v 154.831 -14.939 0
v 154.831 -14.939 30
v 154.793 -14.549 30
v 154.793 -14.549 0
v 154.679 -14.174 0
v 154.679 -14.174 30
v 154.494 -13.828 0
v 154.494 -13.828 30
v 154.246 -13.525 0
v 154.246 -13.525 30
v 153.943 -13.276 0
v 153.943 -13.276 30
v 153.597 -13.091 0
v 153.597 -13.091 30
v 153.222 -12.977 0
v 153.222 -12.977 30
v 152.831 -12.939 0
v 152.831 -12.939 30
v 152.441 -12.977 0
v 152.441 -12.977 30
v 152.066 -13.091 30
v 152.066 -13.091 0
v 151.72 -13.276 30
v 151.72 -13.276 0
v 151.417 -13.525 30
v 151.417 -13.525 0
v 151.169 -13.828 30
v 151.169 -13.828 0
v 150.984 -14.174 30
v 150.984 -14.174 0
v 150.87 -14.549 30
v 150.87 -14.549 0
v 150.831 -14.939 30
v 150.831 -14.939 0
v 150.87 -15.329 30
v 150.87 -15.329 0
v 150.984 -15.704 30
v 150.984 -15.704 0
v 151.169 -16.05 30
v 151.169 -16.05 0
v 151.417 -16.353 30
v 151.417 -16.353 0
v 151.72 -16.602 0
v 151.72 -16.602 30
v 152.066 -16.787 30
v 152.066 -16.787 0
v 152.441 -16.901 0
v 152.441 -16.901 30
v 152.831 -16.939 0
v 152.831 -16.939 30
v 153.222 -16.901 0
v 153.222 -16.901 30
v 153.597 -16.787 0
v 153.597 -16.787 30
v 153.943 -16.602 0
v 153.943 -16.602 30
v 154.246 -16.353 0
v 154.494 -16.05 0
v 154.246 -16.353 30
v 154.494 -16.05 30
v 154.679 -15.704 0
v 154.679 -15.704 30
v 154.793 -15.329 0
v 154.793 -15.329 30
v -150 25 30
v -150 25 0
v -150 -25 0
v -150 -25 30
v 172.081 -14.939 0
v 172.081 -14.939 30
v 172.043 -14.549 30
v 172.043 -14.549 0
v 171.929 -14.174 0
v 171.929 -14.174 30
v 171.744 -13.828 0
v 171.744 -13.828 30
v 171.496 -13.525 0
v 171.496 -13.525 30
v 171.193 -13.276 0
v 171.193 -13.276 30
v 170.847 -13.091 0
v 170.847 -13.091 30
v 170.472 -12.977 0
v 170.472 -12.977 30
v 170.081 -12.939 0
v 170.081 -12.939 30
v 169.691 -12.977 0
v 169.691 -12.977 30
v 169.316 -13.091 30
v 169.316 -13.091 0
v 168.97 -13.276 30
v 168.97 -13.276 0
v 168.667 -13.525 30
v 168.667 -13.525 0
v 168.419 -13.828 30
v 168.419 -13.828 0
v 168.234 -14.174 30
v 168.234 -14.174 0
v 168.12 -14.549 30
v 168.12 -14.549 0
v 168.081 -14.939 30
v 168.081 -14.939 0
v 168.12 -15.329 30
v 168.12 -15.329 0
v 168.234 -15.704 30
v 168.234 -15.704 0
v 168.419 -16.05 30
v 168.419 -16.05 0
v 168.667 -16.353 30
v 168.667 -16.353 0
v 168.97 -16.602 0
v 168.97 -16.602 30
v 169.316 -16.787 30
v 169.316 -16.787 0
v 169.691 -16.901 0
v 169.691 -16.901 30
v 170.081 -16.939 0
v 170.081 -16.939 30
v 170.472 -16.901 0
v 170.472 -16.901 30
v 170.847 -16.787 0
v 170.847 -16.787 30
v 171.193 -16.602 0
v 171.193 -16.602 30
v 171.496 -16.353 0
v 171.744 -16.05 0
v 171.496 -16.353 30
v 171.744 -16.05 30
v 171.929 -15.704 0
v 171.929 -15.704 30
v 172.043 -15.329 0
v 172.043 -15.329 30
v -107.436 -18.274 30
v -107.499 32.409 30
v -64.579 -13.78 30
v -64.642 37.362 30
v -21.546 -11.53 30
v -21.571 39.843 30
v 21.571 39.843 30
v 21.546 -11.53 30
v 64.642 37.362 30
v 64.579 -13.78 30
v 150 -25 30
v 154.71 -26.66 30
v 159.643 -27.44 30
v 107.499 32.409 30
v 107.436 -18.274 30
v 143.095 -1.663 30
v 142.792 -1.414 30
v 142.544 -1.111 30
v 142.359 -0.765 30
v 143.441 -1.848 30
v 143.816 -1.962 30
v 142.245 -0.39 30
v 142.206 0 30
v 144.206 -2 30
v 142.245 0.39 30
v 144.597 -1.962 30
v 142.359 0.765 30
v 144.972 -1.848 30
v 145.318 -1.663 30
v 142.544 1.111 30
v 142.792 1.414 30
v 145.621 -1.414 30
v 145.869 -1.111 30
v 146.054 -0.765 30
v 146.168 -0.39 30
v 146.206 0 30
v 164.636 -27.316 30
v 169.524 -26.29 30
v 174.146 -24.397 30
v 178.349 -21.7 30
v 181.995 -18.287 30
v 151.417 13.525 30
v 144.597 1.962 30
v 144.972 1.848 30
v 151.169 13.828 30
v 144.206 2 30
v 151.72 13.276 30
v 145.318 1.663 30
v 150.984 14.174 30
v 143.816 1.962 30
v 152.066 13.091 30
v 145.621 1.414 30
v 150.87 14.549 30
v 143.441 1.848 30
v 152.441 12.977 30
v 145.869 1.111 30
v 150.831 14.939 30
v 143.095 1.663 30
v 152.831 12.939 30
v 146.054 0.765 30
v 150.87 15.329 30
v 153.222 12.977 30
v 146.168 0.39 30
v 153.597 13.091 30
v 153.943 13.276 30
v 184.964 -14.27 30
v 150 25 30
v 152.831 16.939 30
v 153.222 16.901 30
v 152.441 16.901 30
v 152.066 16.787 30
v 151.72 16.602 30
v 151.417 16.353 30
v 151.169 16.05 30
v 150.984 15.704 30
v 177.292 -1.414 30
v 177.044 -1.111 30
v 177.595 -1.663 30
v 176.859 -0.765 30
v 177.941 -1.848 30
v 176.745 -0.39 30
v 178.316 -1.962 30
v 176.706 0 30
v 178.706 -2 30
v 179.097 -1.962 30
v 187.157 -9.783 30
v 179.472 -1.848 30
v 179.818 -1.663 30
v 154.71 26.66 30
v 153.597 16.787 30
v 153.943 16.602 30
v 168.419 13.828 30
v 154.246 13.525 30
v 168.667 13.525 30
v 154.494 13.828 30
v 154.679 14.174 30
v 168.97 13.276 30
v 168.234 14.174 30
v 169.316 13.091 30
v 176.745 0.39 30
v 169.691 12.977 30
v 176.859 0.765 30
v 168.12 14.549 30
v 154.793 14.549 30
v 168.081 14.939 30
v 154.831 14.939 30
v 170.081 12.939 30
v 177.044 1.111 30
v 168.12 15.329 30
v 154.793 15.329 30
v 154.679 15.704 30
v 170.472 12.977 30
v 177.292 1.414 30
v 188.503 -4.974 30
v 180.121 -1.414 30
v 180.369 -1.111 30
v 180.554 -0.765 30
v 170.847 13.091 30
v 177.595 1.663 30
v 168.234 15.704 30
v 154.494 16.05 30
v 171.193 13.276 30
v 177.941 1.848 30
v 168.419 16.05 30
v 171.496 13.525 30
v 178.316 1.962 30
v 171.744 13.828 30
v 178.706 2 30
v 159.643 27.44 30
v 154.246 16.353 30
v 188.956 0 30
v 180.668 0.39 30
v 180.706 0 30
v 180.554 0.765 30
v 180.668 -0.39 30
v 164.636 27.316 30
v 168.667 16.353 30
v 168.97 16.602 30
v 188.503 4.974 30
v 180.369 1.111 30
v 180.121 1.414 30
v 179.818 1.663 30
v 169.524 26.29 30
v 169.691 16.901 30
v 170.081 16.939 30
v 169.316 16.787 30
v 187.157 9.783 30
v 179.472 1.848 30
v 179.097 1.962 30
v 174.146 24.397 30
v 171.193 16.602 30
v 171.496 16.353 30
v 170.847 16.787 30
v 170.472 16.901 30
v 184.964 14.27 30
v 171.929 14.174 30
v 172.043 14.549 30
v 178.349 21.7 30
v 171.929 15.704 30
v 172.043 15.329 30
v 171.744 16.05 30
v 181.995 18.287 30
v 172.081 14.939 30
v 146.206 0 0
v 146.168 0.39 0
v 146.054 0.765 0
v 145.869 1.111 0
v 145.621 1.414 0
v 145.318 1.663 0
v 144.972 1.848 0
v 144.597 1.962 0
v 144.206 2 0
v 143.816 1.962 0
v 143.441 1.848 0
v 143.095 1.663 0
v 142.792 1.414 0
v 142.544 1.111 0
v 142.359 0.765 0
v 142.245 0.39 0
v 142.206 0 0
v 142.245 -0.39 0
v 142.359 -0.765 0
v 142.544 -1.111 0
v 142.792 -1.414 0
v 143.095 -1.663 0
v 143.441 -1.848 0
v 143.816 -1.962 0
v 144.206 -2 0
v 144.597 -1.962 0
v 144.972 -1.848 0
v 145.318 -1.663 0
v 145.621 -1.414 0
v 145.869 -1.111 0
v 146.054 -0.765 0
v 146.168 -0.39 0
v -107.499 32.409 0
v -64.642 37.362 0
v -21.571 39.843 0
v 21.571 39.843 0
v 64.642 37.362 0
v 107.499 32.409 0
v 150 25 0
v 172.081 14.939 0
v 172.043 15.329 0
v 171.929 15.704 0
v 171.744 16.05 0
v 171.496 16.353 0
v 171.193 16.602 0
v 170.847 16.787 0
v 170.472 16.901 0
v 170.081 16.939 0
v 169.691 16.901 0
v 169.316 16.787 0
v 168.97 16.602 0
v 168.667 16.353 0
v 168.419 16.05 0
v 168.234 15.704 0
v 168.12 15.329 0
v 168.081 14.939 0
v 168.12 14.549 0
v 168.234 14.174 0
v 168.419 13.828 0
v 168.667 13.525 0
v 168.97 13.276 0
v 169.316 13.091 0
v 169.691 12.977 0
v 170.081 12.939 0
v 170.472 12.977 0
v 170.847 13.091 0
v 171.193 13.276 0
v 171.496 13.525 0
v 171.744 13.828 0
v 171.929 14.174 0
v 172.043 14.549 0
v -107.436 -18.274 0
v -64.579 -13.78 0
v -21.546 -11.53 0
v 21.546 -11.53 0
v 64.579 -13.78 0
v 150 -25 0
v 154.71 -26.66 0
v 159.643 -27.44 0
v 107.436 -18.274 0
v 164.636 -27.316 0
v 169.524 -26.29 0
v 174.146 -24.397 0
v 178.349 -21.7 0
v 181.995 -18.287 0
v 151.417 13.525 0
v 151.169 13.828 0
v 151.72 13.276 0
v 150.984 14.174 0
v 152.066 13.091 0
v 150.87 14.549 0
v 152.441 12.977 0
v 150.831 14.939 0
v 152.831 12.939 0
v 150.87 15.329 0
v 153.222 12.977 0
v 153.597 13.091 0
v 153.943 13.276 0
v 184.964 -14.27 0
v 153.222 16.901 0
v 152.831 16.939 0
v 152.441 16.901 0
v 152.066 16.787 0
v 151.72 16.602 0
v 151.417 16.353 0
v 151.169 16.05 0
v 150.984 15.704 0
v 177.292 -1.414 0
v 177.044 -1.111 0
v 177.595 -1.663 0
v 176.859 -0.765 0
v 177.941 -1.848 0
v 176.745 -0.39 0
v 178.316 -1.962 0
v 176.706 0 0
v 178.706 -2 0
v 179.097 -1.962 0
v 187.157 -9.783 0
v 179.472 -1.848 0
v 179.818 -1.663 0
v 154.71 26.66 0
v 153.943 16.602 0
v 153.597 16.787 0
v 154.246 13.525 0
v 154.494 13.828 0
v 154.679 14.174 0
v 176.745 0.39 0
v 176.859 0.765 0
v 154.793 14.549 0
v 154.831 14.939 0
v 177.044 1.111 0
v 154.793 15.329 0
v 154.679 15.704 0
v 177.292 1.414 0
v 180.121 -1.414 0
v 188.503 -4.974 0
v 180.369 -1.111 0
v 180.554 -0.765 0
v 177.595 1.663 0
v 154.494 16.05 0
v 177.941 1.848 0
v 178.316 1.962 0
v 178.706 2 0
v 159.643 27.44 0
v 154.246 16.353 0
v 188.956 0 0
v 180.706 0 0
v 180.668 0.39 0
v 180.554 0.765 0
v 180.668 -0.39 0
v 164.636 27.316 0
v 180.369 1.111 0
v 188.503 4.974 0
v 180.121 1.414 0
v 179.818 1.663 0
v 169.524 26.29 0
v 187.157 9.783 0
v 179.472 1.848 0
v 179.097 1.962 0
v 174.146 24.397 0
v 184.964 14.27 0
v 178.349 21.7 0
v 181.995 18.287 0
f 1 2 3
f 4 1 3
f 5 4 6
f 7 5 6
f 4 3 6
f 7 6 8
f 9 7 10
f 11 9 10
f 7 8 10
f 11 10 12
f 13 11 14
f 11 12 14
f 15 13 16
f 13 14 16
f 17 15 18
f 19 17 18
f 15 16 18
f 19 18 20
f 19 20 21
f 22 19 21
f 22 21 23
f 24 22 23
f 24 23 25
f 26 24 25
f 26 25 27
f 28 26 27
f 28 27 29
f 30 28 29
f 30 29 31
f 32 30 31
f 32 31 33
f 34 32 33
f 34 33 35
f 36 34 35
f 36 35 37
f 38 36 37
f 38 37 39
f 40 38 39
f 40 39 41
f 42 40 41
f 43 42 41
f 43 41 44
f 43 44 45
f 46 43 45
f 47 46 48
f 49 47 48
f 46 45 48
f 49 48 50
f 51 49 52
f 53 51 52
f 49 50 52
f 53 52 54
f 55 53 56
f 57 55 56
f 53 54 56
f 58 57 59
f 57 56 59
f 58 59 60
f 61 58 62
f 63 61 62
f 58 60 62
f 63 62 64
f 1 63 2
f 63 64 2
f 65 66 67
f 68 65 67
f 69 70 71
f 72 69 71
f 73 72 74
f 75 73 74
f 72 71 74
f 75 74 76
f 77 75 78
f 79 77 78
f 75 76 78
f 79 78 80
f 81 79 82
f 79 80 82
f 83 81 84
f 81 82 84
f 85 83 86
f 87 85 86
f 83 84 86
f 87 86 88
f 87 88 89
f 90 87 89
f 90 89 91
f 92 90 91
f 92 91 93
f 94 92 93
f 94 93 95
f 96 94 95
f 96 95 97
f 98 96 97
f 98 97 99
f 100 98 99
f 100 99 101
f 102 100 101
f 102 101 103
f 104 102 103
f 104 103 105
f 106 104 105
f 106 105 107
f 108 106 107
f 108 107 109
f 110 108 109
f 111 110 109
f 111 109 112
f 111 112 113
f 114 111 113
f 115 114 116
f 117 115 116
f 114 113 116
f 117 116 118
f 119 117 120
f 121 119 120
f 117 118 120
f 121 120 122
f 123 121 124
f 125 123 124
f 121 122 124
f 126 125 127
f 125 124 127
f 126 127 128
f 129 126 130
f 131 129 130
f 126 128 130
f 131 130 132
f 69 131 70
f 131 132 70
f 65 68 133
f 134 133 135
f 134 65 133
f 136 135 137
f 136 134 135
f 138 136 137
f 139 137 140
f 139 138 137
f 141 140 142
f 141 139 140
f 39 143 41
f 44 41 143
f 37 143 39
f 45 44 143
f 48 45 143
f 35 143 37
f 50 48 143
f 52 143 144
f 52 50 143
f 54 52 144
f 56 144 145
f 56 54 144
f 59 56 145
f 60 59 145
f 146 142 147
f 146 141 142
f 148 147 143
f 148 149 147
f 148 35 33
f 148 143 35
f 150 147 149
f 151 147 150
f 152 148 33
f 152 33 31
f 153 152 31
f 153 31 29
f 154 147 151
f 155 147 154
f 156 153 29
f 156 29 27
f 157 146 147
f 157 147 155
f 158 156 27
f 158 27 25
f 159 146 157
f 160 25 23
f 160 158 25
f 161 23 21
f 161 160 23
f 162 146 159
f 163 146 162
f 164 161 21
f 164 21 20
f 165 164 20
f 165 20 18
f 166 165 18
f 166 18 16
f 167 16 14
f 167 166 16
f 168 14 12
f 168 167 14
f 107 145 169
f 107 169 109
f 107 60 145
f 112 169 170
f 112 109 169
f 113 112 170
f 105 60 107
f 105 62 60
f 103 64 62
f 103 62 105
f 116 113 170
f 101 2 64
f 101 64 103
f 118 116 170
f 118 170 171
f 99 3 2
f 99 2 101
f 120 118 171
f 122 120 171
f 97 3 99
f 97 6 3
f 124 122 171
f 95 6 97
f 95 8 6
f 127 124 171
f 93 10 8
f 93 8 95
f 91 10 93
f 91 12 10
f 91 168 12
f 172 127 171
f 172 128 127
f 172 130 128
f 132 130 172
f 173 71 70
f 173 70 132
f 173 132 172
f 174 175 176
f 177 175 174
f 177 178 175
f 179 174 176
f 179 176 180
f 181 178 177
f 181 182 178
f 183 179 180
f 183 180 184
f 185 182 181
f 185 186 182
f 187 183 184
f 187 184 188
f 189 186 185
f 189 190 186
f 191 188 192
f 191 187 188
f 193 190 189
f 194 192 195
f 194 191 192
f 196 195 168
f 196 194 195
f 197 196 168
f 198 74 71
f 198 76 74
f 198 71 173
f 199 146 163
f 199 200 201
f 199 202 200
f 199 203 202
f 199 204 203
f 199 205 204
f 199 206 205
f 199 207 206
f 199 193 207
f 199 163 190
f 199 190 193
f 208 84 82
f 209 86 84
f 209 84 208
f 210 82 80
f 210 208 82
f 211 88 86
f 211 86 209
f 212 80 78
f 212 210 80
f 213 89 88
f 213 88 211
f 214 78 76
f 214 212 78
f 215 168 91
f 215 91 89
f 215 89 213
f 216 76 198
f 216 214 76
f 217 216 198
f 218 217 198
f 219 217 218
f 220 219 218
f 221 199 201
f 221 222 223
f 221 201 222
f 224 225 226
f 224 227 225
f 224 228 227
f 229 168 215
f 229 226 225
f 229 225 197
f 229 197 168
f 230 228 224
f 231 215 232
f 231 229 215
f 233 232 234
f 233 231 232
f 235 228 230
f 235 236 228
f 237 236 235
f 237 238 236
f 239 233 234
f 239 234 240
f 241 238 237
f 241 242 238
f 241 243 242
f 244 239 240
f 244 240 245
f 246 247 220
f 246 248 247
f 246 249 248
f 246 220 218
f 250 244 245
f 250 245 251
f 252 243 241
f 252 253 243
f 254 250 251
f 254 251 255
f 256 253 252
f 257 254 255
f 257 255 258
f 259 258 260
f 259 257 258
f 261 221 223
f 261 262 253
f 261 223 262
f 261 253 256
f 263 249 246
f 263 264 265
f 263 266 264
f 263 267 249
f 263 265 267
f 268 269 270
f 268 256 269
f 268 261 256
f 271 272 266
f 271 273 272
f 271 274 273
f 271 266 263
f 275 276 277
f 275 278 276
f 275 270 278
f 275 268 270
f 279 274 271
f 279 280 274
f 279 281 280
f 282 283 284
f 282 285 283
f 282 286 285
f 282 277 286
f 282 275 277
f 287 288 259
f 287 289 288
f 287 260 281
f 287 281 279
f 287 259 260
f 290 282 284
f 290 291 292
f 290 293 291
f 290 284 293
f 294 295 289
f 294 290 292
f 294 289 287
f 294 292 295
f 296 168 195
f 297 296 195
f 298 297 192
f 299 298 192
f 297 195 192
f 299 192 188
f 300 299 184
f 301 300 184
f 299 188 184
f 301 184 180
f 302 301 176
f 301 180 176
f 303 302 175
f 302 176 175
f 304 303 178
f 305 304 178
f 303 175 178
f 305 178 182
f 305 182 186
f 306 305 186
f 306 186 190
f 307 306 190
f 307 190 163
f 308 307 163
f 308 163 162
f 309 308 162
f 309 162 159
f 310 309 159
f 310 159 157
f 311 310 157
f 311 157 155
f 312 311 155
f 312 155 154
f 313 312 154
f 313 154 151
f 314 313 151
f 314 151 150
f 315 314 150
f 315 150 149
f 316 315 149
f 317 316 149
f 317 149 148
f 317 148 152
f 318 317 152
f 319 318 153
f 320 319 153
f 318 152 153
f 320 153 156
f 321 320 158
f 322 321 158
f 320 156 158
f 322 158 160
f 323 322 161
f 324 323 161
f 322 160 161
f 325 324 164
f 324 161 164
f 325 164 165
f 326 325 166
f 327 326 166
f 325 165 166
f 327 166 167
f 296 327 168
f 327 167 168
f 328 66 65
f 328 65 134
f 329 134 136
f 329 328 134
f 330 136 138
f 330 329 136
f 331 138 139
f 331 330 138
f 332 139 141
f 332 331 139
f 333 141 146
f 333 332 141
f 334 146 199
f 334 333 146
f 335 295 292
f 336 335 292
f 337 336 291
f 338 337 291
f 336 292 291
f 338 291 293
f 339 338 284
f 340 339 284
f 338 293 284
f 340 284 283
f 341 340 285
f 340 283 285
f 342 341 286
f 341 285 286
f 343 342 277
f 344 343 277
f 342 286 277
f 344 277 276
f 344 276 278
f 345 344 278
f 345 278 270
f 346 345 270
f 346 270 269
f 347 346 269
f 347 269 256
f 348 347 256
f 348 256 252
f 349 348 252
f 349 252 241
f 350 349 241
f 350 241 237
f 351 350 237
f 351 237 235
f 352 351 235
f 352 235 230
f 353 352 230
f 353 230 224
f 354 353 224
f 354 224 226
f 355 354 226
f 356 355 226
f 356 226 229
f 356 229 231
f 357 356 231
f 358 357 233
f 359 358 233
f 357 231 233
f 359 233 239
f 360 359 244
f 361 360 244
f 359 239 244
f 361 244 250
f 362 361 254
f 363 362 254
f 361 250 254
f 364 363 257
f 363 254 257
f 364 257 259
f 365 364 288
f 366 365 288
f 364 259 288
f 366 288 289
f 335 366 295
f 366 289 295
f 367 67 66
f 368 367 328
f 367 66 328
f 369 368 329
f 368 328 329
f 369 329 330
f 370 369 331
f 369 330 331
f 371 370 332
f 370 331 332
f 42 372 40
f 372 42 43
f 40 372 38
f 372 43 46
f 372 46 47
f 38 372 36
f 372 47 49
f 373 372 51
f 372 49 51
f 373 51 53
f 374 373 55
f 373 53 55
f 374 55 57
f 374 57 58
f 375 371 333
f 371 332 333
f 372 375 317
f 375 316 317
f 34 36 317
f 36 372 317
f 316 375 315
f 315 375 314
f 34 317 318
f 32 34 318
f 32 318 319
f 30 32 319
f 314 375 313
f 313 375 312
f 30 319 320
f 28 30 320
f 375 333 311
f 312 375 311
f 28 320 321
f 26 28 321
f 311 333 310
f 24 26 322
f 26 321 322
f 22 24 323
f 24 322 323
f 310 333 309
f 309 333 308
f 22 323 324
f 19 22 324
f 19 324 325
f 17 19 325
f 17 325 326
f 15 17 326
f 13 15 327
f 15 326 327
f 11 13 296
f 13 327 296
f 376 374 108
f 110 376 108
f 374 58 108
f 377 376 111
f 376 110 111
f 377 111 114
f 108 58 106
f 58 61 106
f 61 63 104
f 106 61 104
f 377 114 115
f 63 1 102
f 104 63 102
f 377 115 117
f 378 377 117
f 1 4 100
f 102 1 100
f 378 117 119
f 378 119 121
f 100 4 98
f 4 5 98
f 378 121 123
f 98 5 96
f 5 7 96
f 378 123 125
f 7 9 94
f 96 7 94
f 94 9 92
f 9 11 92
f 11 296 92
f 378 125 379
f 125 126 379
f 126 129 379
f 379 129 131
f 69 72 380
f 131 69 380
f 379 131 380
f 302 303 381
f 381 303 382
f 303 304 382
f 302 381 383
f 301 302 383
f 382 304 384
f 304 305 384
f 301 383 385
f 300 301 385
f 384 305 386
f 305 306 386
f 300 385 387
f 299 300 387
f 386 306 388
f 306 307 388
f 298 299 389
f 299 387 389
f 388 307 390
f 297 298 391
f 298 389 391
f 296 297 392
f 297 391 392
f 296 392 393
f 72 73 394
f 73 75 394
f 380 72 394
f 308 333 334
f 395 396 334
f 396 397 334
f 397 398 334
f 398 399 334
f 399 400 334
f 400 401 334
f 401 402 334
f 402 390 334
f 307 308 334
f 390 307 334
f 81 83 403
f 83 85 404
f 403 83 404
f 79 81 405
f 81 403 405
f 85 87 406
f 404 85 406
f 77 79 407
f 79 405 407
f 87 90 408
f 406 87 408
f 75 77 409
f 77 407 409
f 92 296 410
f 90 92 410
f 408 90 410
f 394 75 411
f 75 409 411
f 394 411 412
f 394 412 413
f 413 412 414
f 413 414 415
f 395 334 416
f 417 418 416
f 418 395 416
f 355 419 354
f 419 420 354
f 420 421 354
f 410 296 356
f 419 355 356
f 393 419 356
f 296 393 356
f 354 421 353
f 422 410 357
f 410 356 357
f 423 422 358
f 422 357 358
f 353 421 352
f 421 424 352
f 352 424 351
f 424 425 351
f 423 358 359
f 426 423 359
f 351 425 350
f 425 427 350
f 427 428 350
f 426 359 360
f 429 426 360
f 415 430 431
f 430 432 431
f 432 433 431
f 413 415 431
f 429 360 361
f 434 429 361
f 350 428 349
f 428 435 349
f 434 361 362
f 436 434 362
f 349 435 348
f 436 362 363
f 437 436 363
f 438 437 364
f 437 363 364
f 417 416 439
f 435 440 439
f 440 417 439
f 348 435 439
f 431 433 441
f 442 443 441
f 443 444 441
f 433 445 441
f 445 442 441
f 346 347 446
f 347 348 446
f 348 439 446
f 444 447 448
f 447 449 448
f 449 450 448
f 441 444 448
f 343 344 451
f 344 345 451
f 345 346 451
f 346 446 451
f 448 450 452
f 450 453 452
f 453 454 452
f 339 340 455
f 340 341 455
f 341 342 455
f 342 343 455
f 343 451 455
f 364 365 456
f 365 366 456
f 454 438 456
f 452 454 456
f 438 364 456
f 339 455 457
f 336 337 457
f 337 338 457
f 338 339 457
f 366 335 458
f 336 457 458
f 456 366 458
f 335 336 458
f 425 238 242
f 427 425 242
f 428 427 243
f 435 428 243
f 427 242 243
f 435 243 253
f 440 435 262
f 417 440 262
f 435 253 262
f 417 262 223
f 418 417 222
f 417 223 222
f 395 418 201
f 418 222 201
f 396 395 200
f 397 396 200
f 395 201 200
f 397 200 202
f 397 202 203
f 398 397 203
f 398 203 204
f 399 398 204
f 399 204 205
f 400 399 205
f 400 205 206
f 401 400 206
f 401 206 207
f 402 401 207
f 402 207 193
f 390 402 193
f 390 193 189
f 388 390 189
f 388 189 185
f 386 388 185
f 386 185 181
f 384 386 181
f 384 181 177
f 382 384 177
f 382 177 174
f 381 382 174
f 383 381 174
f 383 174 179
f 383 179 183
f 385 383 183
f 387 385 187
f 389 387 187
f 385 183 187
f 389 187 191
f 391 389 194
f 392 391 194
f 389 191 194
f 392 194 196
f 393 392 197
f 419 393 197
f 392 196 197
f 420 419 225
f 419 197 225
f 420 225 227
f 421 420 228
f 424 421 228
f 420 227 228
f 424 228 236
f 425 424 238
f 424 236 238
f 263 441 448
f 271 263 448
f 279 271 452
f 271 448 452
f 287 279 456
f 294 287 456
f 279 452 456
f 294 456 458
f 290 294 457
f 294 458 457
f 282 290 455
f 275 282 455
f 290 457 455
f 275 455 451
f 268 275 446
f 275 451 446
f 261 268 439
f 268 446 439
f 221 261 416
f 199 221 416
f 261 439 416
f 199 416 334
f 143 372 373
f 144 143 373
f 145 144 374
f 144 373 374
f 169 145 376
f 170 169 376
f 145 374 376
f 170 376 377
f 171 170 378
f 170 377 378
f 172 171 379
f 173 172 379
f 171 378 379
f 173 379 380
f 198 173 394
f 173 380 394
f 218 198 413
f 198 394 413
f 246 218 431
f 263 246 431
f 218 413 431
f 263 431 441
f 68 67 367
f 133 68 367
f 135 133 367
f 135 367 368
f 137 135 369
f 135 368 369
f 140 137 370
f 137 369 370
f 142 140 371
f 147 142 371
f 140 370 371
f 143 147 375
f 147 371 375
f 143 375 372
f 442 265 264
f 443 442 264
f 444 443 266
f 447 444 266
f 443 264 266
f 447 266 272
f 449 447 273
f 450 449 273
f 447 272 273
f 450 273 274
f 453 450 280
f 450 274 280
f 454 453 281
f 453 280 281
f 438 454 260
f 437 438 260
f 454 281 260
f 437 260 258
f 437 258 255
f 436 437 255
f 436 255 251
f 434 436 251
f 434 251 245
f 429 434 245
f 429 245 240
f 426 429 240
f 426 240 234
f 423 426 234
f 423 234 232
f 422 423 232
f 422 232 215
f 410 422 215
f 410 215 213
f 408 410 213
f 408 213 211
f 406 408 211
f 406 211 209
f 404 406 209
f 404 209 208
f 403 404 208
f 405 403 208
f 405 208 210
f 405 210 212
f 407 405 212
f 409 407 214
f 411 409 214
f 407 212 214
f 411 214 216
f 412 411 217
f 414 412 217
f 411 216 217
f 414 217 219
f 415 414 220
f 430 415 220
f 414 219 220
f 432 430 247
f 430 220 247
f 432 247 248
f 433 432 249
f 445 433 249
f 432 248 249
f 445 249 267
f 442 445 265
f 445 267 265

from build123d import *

# Parameters (mm, degrees)
EXTRUDE_1_DEPTH     = 30
SKETCH_2_R          = 2
CUT_EXTRUDE_1_DEPTH = 196.491190428


with BuildPart() as part:
    # 草图1 → 凸台-拉伸1 (new body)
    with BuildSketch(Plane.XY):
        with BuildLine():
            Line((150, 25), (-150, 25))
            Line((-150, 25), (-150, -25))
            ThreePointArc((-150, -25), (0, -11.248129774), (150, -25))
            ThreePointArc((150, -25), (133.956439237, 0), (150, 25))
        make_face()
        with BuildLine():
            ThreePointArc((-150, 25), (0, 40.153077165), (150, 25))
            Line((150, 25), (-150, 25))
        make_face()
        with BuildLine():
            ThreePointArc((188.956439237, 0), (176.309013441, 23.14413618), (150, 25))
            Line((150, 25), (150, -25))
            ThreePointArc((150, -25), (176.309013441, -23.14413618), (188.956439237, 0))
        make_face()
        with BuildLine():
            Line((150, -25), (150, 25))
            ThreePointArc((150, 25), (133.956439237, 0), (150, -25))
        make_face()
    extrude(amount=EXTRUDE_1_DEPTH)

    # 草图2 → 切除-拉伸1 (cut, through all)
    with BuildSketch(Plane.XY.offset(30)):
        with Locations((178.706439237, 0)):
            Circle(SKETCH_2_R)
        with Locations((170.081439237, -14.938938215)):
            Circle(SKETCH_2_R)
        with Locations((152.831439237, -14.938938215)):
            Circle(SKETCH_2_R)
        with Locations((144.206439237, 0)):
            Circle(SKETCH_2_R)
        with Locations((152.831439237, 14.938938215)):
            Circle(SKETCH_2_R)
        with Locations((170.081439237, 14.938938215)):
            Circle(SKETCH_2_R)
    extrude(amount=-CUT_EXTRUDE_1_DEPTH, mode=Mode.SUBTRACT)


solid = part.part
